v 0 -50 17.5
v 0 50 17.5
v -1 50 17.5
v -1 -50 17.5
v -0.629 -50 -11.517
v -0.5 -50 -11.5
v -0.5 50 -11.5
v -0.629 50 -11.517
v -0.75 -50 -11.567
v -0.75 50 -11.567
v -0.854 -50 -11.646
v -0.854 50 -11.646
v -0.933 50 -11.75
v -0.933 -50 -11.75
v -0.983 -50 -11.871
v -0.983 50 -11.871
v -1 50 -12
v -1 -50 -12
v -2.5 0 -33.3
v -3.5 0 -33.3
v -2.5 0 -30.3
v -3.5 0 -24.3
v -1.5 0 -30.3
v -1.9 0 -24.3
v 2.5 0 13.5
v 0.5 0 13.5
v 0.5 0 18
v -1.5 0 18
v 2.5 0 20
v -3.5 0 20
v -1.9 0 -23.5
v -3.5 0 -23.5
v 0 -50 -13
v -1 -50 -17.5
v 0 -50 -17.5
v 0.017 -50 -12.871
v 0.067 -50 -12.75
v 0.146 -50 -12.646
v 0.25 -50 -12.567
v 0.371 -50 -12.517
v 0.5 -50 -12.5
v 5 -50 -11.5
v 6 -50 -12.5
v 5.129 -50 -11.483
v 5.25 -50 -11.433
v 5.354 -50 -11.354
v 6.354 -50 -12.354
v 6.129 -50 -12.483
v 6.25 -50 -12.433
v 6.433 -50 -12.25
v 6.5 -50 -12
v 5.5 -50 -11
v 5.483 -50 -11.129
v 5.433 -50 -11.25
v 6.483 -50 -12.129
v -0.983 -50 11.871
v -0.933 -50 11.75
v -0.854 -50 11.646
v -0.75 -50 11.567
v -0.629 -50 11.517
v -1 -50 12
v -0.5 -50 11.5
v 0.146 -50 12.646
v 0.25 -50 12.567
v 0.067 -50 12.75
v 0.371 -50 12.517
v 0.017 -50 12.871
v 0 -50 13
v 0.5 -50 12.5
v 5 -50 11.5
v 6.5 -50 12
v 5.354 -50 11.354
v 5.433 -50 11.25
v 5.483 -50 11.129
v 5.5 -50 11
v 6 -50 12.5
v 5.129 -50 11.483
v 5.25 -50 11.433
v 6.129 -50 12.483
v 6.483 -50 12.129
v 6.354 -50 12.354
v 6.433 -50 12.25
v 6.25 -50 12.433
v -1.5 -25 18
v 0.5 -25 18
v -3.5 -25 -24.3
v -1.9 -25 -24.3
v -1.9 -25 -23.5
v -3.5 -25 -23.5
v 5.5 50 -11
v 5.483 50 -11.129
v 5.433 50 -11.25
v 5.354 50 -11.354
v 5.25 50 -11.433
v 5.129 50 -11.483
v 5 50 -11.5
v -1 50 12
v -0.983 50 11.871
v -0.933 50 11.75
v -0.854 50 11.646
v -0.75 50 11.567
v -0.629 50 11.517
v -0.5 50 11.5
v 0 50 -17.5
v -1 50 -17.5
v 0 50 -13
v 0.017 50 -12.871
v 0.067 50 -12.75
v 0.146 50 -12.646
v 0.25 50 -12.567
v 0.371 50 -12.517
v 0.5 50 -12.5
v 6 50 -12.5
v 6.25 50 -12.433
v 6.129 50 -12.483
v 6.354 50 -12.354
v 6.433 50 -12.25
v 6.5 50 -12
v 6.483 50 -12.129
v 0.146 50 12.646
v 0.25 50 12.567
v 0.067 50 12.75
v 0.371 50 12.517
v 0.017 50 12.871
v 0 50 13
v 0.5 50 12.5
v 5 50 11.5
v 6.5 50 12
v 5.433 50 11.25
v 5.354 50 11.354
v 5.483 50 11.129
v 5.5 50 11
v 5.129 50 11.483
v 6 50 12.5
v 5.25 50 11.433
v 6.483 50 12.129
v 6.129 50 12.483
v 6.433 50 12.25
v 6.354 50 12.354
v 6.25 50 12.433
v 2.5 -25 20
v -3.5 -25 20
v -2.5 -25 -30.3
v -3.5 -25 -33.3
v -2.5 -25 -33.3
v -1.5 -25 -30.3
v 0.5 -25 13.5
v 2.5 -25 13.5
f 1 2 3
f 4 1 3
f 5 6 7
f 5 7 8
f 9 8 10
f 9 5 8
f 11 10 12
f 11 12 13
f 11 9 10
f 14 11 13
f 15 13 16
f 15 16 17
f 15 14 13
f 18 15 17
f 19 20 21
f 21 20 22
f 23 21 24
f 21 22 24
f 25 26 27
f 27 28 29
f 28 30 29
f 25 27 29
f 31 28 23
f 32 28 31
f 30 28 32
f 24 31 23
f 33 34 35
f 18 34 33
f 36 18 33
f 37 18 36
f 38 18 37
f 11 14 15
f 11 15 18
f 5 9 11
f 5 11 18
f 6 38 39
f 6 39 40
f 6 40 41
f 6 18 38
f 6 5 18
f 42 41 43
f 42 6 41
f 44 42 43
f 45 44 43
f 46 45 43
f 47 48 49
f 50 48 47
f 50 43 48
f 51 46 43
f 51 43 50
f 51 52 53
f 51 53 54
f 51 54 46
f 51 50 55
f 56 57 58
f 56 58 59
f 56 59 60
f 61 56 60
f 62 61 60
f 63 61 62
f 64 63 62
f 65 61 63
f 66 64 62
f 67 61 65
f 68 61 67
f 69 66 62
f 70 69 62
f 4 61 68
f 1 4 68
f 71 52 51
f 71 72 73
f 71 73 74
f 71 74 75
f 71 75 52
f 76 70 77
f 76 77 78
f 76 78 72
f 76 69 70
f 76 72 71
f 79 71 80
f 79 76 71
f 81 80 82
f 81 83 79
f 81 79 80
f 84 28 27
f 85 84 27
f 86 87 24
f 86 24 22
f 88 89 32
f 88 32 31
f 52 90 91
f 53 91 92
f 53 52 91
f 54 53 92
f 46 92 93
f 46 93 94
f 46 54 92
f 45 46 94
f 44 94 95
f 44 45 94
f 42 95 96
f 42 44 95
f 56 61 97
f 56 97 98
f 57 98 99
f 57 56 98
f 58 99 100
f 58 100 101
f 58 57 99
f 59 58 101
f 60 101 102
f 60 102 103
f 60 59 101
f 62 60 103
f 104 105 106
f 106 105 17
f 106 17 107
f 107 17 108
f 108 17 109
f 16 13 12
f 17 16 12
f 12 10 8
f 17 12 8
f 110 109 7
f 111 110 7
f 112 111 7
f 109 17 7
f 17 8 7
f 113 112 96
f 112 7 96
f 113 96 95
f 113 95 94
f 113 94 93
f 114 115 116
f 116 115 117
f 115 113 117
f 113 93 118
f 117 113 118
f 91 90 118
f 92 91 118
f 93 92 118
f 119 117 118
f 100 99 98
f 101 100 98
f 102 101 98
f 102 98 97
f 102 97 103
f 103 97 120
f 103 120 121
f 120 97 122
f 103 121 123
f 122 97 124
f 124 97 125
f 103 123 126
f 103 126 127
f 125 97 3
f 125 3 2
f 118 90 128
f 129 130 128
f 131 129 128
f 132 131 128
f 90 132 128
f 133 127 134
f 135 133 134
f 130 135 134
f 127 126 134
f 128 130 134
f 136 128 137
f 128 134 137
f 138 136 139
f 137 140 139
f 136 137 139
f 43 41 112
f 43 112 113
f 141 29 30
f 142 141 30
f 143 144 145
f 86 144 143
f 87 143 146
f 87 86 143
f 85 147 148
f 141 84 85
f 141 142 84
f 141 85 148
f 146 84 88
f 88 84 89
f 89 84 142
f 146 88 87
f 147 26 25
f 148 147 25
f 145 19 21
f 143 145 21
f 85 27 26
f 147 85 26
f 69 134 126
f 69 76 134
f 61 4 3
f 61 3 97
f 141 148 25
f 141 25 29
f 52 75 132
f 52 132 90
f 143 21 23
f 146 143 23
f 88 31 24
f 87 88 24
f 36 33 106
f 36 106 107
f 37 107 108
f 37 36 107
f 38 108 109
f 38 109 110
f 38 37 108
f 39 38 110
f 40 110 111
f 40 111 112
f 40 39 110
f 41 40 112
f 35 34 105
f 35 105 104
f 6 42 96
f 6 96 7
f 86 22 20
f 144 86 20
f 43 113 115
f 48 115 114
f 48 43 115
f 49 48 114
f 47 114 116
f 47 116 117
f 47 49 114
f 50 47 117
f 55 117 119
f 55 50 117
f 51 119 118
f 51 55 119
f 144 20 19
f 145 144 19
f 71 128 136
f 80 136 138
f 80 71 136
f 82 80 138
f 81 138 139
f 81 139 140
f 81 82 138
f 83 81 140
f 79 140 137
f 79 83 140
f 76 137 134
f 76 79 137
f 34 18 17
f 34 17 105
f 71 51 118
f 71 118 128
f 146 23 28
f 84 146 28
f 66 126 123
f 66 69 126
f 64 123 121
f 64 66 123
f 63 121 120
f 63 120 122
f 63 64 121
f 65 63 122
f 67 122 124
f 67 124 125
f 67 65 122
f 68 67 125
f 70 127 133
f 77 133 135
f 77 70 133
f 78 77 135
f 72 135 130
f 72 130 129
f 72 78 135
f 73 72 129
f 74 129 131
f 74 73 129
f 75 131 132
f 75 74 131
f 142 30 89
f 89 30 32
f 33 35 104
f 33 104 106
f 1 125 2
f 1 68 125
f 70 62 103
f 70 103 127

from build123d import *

# Parameters (mm, degrees)
F1_DEPTH      = 50
F1_DEPTH_BACK = 50
F3_DEPTH      = 25


with BuildPart() as f1:
    # F0 (on Front) → F1 (new body, two sides)
    with BuildSketch(Plane.XZ) as f1_sk:
        with BuildLine():
            Line((0, 13), (0, 17.5))
            Line((0, 17.5), (-1, 17.5))
            Line((-1, 17.5), (-1, 12))
            ThreePointArc((-1, 12), (-0.853553, 11.646447), (-0.5, 11.5))
            Line((-0.5, 11.5), (5, 11.5))
            ThreePointArc((5, 11.5), (5.353553, 11.353553), (5.5, 11))
            Line((5.5, 11), (5.5, -11))
            ThreePointArc((5.5, -11), (5.353553, -11.353553), (5, -11.5))
            Line((5, -11.5), (-0.5, -11.5))
            ThreePointArc((-0.5, -11.5), (-0.853553, -11.646447), (-1, -12))
            Line((-1, -12), (-1, -17.5))
            Line((-1, -17.5), (0, -17.5))
            Line((0, -17.5), (0, -13))
            ThreePointArc((0, -13), (0.146447, -12.646447), (0.5, -12.5))
            Line((0.5, -12.5), (6, -12.5))
            ThreePointArc((6, -12.5), (6.353553, -12.353553), (6.5, -12))
            Line((6.5, -12), (6.5, 12))
            ThreePointArc((6.5, 12), (6.353553, 12.353553), (6, 12.5))
            Line((6, 12.5), (0.5, 12.5))
            ThreePointArc((0.5, 12.5), (0.146447, 12.646447), (0, 13))
        make_face()
    extrude(amount=F1_DEPTH)
    extrude(f1_sk.sketch, amount=-F1_DEPTH_BACK)


with BuildPart() as f3:
    # F2 (on Front) → F3 (new body)
    with BuildSketch(Plane.XZ):
        Polygon((0.5, 18), (0.5, 15.027218), (0.5, 13.5), (2.5, 13.5), (2.5, 20), (-3.5, 20), (-3.5, -23.5), (-1.9, -23.5), (-1.9, -24.3), (-3.5, -24.3), (-3.5, -30.3), (-3.5, -33.3), (-2.5, -33.3), (-2.5, -30.3), (-1.5, -30.3), (-1.5, -24.3), (-1.5, -23.5), (-1.5, 18), align=None)
    extrude(amount=F3_DEPTH)


solid = Compound([f1.part, f3.part])
